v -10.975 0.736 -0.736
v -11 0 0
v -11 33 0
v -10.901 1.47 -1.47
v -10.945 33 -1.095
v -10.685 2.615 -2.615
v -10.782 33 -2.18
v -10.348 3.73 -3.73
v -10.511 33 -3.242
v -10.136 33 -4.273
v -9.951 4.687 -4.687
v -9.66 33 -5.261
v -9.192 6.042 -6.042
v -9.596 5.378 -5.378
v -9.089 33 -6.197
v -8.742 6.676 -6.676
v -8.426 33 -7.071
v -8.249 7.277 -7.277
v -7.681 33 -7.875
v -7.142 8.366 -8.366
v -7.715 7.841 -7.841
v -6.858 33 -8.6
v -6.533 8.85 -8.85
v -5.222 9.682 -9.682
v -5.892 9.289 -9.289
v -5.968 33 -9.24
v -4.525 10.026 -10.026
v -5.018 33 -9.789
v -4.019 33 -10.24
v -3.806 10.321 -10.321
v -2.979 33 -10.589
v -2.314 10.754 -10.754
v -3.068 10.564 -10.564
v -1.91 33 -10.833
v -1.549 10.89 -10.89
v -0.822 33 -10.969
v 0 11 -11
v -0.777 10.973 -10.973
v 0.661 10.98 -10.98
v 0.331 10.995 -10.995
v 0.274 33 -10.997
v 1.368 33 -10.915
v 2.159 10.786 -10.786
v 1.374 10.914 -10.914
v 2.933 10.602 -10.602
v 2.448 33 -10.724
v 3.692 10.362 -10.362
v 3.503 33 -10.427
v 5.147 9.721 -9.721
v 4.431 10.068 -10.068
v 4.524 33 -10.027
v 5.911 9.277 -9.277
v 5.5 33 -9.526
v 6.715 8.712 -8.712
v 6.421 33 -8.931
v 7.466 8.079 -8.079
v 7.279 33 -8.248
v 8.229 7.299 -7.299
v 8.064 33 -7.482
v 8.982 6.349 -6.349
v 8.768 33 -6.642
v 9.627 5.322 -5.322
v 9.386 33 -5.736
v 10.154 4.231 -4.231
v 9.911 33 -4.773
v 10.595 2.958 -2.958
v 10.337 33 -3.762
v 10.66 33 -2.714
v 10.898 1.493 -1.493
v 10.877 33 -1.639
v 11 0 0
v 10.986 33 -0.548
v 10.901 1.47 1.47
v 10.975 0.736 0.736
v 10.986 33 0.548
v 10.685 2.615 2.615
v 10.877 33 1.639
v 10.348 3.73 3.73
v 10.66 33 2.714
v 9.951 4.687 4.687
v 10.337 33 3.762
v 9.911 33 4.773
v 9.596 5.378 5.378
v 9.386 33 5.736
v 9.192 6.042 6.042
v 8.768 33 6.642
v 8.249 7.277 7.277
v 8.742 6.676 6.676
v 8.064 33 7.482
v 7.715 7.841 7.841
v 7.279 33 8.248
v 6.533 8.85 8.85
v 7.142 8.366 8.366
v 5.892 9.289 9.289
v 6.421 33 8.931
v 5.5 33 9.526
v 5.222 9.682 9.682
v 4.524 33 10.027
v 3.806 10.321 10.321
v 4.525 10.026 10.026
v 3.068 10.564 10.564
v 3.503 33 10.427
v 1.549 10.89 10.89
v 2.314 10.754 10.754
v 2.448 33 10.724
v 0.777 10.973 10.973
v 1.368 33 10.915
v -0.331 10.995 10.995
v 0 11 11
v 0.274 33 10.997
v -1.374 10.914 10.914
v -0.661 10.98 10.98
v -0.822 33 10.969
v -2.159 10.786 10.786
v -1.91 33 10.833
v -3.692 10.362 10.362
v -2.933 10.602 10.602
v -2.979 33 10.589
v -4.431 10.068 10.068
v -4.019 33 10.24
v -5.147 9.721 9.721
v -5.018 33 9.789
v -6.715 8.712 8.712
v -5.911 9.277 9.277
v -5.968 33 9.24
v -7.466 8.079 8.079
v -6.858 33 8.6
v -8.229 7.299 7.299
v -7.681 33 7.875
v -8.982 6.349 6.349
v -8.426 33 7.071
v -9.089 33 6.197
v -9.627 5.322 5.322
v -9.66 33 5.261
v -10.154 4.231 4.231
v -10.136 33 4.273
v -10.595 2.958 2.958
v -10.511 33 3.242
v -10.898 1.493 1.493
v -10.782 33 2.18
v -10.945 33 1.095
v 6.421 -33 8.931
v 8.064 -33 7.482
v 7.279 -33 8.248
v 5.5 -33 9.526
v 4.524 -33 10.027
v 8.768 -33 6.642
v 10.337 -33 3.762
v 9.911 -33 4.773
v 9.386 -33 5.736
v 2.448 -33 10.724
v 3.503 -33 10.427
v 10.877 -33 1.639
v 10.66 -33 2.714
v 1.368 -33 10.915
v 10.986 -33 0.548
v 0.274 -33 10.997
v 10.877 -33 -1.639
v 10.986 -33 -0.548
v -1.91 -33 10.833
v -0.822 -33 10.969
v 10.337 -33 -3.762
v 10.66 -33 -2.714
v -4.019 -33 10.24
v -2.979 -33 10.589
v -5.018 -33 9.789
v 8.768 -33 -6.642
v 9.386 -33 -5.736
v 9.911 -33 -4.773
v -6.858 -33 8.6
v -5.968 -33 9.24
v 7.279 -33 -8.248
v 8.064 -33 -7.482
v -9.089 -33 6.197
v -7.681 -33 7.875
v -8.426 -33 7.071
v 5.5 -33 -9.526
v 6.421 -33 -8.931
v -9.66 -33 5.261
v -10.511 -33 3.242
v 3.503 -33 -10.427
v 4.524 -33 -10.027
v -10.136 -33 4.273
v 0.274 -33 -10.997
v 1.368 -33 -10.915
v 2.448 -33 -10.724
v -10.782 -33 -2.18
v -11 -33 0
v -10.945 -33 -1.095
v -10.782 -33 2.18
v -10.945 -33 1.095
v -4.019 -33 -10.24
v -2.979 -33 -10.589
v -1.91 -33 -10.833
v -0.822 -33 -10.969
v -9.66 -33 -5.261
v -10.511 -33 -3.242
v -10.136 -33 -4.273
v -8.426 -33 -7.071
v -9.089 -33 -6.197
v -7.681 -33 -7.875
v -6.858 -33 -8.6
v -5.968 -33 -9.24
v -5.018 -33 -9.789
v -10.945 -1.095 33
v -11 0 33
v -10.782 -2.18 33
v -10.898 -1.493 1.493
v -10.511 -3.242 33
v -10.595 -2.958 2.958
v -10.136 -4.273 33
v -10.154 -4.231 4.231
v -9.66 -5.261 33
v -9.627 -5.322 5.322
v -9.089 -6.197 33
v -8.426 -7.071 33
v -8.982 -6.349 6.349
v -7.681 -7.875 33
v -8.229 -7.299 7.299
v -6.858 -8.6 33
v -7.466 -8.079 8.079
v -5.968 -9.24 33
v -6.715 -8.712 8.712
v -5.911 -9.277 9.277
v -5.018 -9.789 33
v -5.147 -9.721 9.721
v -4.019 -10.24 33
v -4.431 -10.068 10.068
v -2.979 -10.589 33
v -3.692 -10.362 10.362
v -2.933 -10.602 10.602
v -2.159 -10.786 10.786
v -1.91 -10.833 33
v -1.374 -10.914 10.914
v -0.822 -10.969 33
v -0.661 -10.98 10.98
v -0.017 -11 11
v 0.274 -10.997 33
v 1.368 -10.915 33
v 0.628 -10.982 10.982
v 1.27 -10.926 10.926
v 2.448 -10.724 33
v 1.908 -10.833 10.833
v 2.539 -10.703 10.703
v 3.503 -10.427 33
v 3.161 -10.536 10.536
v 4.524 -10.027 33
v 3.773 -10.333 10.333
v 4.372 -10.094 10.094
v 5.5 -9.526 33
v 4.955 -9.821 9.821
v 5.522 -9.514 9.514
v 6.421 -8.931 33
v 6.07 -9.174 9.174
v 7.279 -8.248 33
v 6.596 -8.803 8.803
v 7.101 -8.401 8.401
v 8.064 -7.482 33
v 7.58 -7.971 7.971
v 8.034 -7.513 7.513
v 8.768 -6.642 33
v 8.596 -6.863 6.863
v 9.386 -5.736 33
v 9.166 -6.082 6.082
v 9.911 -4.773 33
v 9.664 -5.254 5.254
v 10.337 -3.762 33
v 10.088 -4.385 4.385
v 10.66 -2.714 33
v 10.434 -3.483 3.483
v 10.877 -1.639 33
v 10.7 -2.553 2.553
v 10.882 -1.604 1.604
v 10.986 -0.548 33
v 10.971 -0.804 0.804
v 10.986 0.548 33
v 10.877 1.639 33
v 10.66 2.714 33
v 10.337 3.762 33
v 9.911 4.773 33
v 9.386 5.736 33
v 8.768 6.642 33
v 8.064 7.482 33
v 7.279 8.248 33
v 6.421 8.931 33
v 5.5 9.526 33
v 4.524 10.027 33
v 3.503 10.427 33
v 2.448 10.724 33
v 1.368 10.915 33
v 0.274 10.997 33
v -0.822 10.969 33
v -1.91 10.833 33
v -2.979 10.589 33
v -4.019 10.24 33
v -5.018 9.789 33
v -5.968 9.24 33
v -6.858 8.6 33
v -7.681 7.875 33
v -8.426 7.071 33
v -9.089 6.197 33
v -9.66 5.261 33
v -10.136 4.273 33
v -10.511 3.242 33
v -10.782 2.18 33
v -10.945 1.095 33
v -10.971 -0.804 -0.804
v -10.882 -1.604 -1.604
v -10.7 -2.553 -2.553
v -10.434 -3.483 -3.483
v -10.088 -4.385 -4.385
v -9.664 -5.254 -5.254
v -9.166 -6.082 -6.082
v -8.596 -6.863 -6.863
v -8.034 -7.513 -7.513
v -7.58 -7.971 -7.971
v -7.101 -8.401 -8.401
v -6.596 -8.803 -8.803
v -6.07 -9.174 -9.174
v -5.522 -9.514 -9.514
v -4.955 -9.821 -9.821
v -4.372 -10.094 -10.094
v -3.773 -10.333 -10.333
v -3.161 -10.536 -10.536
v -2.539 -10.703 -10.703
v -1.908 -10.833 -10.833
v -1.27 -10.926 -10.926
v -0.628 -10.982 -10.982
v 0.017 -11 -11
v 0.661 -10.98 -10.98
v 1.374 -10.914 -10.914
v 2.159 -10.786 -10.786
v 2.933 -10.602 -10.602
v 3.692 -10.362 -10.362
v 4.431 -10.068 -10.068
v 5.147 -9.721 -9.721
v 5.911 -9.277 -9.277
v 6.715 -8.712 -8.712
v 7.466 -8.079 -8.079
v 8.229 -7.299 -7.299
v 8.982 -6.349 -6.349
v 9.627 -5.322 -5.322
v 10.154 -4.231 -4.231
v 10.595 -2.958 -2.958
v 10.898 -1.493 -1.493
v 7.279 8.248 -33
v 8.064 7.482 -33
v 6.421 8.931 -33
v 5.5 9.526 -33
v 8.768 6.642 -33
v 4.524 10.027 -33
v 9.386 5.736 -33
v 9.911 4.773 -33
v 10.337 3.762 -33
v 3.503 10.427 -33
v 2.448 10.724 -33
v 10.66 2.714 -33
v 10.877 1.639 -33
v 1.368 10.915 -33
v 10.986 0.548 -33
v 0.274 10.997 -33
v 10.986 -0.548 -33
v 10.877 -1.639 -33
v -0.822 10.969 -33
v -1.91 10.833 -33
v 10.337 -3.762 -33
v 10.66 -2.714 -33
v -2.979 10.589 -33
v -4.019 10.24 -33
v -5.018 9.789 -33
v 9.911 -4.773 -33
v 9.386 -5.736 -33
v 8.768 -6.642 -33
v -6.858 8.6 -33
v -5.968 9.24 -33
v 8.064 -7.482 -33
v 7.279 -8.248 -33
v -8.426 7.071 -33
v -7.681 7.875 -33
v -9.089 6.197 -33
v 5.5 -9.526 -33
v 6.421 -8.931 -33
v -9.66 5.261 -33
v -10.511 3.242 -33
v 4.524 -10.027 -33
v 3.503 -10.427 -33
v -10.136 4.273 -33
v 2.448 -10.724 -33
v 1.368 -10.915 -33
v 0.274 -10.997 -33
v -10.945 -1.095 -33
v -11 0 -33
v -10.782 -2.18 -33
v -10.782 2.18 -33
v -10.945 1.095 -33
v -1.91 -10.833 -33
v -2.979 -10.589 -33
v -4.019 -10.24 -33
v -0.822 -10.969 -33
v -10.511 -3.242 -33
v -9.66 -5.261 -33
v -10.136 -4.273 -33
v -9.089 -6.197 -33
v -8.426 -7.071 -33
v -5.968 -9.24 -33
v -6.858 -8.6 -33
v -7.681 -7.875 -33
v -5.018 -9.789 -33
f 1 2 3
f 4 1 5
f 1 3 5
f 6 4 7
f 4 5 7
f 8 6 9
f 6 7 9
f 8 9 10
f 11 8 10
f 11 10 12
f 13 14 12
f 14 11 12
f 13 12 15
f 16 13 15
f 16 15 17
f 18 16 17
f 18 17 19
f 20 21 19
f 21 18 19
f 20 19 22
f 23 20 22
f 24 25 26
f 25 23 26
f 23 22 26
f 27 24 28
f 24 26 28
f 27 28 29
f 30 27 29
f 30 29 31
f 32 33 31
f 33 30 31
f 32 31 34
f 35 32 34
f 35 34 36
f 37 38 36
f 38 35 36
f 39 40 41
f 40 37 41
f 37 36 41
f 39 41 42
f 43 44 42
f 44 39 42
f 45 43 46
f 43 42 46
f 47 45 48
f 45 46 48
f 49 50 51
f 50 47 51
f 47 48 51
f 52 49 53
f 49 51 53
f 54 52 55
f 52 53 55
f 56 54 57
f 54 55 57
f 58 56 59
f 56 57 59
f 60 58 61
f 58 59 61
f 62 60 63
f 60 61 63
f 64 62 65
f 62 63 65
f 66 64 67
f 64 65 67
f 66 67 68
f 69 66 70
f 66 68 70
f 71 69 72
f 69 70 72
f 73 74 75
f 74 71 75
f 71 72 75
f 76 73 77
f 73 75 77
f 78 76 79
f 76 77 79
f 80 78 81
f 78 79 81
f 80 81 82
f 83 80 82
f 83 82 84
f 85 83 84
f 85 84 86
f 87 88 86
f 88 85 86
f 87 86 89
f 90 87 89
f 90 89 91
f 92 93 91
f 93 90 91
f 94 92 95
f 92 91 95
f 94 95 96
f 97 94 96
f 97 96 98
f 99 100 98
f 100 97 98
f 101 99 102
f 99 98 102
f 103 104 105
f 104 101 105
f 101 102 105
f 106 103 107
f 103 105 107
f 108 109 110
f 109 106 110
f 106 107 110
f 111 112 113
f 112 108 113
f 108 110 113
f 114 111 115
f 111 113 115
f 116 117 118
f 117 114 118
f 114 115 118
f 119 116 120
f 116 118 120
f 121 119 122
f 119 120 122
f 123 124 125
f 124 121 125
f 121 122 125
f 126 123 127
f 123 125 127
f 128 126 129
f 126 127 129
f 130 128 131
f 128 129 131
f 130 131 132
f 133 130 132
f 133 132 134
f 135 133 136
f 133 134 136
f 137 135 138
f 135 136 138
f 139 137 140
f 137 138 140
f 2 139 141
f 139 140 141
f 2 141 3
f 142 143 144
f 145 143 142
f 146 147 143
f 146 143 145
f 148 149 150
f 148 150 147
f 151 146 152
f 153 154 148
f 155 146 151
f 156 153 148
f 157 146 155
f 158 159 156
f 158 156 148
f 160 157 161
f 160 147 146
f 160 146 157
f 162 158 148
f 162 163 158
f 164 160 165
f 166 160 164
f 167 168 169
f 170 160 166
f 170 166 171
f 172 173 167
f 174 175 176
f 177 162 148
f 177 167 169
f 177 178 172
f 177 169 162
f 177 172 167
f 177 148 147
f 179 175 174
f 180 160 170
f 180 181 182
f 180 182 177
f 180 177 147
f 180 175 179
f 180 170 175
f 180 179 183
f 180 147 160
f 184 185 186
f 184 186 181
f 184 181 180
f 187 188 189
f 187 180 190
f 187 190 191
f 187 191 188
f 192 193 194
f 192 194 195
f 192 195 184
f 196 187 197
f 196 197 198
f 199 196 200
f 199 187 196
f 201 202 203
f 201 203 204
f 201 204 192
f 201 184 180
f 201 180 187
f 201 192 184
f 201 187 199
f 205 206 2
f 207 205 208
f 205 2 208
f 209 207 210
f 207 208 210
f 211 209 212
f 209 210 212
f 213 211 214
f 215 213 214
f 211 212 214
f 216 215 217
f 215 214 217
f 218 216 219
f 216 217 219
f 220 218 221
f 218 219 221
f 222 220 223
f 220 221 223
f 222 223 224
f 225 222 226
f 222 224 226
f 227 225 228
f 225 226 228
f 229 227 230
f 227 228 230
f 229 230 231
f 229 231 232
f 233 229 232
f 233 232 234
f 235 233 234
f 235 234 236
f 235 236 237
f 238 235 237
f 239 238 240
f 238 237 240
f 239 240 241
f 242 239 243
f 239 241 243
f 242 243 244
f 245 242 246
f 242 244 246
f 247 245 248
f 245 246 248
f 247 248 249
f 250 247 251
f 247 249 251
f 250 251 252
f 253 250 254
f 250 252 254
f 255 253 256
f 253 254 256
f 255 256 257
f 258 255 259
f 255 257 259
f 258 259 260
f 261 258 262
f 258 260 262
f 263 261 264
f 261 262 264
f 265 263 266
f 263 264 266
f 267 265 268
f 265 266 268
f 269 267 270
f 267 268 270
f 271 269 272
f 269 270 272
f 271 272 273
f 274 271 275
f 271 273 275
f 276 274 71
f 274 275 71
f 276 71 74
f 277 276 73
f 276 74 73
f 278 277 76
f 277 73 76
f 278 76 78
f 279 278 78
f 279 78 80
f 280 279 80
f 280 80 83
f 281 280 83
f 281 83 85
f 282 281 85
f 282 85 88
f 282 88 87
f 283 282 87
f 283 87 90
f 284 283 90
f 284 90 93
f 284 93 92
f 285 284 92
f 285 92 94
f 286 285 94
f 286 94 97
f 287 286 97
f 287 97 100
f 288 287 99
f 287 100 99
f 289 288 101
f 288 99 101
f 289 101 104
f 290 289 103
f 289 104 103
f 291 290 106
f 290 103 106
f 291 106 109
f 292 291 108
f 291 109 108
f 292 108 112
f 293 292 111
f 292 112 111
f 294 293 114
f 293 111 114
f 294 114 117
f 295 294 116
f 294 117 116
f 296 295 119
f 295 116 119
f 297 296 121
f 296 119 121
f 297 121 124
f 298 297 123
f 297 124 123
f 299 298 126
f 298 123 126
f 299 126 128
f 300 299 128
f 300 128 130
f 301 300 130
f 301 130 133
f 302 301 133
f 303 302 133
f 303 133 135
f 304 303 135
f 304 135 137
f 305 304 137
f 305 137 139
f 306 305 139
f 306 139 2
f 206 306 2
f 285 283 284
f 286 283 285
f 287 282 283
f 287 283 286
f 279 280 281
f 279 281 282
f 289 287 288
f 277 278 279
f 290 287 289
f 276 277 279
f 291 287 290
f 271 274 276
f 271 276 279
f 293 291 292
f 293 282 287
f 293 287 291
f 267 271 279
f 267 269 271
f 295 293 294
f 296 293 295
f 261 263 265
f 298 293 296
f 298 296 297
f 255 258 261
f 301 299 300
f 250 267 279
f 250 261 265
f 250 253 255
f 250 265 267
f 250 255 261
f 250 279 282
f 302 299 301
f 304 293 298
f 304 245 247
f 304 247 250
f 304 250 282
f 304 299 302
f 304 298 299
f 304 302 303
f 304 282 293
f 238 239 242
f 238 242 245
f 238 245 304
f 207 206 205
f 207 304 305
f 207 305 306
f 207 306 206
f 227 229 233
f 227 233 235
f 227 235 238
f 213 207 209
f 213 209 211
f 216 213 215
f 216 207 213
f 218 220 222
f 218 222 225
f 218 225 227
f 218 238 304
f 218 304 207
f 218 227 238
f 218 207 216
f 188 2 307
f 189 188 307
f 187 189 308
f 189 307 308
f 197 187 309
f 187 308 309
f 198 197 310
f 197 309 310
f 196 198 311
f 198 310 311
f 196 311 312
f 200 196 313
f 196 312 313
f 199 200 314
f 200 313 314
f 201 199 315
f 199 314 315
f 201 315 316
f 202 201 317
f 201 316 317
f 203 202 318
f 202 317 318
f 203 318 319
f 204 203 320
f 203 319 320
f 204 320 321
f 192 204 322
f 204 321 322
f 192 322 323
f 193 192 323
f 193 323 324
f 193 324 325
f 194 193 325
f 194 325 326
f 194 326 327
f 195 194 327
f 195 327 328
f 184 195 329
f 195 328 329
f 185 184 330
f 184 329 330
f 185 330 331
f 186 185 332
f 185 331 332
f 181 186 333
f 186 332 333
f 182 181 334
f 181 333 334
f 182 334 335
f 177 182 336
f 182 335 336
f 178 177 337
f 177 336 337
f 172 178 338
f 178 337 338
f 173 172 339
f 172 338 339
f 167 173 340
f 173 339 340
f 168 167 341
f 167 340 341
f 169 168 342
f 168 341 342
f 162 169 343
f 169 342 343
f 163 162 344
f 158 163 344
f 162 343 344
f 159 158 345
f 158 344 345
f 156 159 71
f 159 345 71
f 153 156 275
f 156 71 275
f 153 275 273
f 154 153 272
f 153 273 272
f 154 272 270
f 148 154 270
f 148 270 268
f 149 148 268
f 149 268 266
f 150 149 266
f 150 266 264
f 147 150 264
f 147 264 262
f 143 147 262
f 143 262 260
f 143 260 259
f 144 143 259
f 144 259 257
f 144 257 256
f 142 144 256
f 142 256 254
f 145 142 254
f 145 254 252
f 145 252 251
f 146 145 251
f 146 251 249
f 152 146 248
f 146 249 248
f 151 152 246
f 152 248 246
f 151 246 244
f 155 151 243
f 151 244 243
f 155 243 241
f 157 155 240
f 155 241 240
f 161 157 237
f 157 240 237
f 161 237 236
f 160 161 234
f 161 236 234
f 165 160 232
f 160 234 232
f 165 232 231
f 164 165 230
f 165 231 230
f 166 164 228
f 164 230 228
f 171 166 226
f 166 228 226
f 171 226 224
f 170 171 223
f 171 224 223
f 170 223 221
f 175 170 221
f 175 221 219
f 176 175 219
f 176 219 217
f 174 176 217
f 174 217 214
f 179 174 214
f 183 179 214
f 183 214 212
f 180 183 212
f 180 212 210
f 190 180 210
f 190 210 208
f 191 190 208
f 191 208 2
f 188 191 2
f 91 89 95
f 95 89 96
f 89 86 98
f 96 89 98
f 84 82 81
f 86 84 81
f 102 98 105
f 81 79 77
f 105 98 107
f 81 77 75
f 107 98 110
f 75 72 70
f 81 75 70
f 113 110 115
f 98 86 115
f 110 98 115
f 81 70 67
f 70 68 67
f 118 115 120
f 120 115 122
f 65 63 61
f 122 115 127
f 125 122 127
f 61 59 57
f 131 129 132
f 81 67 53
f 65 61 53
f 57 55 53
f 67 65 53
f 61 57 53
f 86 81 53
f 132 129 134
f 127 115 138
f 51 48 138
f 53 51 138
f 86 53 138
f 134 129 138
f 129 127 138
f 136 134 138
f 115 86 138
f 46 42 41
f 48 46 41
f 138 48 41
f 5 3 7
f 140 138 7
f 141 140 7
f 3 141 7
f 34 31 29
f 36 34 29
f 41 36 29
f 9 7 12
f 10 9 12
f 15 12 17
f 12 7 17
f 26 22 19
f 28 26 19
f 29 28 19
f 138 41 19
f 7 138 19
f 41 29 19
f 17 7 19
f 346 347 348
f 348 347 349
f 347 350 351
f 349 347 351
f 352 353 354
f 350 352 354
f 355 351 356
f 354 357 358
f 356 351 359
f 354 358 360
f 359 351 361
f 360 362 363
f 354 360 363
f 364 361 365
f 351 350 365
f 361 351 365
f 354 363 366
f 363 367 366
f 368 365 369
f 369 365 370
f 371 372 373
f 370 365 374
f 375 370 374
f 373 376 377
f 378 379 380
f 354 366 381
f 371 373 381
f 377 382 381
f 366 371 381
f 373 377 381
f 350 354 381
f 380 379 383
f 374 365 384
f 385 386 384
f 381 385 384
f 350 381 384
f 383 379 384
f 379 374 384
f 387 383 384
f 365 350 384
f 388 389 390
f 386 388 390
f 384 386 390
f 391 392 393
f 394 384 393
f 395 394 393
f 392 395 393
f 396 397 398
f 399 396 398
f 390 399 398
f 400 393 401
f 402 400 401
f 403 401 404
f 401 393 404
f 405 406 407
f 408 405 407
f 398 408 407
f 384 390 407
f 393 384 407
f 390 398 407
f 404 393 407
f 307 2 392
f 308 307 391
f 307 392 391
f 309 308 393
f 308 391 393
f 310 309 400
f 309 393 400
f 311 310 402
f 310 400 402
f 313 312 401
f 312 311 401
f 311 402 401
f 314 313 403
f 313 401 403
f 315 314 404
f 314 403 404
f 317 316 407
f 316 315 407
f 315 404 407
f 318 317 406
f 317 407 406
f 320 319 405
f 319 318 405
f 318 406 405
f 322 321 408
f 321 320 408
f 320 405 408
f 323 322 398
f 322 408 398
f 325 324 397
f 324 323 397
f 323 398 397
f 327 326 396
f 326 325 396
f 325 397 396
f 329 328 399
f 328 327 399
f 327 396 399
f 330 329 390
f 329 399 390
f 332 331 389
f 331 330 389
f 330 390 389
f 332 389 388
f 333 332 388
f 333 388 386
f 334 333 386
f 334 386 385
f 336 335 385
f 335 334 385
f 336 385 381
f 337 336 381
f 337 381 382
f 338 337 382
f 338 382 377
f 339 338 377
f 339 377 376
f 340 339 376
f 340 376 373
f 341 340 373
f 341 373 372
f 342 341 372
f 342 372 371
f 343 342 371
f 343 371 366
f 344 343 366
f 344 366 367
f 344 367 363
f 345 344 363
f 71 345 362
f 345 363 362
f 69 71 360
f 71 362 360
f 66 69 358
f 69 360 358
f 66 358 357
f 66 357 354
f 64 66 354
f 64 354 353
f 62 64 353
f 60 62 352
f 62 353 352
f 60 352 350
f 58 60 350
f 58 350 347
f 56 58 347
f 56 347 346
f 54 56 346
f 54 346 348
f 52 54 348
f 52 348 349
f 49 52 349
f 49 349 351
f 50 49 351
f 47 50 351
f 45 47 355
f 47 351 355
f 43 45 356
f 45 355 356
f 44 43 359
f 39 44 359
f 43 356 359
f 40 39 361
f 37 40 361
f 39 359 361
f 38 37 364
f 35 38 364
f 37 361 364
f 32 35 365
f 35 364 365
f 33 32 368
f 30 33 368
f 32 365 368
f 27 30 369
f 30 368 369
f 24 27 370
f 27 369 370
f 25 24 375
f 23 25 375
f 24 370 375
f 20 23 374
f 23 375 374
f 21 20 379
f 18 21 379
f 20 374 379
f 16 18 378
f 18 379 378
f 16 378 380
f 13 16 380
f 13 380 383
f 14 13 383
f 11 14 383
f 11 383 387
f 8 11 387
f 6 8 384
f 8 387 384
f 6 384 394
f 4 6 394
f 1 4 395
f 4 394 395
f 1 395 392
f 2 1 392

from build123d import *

# Parameters (mm, degrees)
SZKIC1_W = 11
SZKIC1_H = 66
SZKIC2_W = 11
SZKIC2_H = 66


with BuildPart() as part:
    # Szkic1 → Obrót1 (revolve)
    with BuildSketch(Plane.XY):
        with Locations((-5.5, 0)):
            Rectangle(SZKIC1_W, SZKIC1_H)
    revolve(axis=Axis((0, 33, 0), (0, -1, 0)))

    # Szkic2 → Obrót2 (revolve)
    with BuildSketch(Plane(origin=(0, 0, 0), x_dir=(1, 0, 0), z_dir=(0, 1, 0))):
        with Locations((-5.5, 0)):
            Rectangle(SZKIC2_W, SZKIC2_H)
    revolve(axis=Axis((0, 0, -33), (0, 0, 1)))


solid = part.part
